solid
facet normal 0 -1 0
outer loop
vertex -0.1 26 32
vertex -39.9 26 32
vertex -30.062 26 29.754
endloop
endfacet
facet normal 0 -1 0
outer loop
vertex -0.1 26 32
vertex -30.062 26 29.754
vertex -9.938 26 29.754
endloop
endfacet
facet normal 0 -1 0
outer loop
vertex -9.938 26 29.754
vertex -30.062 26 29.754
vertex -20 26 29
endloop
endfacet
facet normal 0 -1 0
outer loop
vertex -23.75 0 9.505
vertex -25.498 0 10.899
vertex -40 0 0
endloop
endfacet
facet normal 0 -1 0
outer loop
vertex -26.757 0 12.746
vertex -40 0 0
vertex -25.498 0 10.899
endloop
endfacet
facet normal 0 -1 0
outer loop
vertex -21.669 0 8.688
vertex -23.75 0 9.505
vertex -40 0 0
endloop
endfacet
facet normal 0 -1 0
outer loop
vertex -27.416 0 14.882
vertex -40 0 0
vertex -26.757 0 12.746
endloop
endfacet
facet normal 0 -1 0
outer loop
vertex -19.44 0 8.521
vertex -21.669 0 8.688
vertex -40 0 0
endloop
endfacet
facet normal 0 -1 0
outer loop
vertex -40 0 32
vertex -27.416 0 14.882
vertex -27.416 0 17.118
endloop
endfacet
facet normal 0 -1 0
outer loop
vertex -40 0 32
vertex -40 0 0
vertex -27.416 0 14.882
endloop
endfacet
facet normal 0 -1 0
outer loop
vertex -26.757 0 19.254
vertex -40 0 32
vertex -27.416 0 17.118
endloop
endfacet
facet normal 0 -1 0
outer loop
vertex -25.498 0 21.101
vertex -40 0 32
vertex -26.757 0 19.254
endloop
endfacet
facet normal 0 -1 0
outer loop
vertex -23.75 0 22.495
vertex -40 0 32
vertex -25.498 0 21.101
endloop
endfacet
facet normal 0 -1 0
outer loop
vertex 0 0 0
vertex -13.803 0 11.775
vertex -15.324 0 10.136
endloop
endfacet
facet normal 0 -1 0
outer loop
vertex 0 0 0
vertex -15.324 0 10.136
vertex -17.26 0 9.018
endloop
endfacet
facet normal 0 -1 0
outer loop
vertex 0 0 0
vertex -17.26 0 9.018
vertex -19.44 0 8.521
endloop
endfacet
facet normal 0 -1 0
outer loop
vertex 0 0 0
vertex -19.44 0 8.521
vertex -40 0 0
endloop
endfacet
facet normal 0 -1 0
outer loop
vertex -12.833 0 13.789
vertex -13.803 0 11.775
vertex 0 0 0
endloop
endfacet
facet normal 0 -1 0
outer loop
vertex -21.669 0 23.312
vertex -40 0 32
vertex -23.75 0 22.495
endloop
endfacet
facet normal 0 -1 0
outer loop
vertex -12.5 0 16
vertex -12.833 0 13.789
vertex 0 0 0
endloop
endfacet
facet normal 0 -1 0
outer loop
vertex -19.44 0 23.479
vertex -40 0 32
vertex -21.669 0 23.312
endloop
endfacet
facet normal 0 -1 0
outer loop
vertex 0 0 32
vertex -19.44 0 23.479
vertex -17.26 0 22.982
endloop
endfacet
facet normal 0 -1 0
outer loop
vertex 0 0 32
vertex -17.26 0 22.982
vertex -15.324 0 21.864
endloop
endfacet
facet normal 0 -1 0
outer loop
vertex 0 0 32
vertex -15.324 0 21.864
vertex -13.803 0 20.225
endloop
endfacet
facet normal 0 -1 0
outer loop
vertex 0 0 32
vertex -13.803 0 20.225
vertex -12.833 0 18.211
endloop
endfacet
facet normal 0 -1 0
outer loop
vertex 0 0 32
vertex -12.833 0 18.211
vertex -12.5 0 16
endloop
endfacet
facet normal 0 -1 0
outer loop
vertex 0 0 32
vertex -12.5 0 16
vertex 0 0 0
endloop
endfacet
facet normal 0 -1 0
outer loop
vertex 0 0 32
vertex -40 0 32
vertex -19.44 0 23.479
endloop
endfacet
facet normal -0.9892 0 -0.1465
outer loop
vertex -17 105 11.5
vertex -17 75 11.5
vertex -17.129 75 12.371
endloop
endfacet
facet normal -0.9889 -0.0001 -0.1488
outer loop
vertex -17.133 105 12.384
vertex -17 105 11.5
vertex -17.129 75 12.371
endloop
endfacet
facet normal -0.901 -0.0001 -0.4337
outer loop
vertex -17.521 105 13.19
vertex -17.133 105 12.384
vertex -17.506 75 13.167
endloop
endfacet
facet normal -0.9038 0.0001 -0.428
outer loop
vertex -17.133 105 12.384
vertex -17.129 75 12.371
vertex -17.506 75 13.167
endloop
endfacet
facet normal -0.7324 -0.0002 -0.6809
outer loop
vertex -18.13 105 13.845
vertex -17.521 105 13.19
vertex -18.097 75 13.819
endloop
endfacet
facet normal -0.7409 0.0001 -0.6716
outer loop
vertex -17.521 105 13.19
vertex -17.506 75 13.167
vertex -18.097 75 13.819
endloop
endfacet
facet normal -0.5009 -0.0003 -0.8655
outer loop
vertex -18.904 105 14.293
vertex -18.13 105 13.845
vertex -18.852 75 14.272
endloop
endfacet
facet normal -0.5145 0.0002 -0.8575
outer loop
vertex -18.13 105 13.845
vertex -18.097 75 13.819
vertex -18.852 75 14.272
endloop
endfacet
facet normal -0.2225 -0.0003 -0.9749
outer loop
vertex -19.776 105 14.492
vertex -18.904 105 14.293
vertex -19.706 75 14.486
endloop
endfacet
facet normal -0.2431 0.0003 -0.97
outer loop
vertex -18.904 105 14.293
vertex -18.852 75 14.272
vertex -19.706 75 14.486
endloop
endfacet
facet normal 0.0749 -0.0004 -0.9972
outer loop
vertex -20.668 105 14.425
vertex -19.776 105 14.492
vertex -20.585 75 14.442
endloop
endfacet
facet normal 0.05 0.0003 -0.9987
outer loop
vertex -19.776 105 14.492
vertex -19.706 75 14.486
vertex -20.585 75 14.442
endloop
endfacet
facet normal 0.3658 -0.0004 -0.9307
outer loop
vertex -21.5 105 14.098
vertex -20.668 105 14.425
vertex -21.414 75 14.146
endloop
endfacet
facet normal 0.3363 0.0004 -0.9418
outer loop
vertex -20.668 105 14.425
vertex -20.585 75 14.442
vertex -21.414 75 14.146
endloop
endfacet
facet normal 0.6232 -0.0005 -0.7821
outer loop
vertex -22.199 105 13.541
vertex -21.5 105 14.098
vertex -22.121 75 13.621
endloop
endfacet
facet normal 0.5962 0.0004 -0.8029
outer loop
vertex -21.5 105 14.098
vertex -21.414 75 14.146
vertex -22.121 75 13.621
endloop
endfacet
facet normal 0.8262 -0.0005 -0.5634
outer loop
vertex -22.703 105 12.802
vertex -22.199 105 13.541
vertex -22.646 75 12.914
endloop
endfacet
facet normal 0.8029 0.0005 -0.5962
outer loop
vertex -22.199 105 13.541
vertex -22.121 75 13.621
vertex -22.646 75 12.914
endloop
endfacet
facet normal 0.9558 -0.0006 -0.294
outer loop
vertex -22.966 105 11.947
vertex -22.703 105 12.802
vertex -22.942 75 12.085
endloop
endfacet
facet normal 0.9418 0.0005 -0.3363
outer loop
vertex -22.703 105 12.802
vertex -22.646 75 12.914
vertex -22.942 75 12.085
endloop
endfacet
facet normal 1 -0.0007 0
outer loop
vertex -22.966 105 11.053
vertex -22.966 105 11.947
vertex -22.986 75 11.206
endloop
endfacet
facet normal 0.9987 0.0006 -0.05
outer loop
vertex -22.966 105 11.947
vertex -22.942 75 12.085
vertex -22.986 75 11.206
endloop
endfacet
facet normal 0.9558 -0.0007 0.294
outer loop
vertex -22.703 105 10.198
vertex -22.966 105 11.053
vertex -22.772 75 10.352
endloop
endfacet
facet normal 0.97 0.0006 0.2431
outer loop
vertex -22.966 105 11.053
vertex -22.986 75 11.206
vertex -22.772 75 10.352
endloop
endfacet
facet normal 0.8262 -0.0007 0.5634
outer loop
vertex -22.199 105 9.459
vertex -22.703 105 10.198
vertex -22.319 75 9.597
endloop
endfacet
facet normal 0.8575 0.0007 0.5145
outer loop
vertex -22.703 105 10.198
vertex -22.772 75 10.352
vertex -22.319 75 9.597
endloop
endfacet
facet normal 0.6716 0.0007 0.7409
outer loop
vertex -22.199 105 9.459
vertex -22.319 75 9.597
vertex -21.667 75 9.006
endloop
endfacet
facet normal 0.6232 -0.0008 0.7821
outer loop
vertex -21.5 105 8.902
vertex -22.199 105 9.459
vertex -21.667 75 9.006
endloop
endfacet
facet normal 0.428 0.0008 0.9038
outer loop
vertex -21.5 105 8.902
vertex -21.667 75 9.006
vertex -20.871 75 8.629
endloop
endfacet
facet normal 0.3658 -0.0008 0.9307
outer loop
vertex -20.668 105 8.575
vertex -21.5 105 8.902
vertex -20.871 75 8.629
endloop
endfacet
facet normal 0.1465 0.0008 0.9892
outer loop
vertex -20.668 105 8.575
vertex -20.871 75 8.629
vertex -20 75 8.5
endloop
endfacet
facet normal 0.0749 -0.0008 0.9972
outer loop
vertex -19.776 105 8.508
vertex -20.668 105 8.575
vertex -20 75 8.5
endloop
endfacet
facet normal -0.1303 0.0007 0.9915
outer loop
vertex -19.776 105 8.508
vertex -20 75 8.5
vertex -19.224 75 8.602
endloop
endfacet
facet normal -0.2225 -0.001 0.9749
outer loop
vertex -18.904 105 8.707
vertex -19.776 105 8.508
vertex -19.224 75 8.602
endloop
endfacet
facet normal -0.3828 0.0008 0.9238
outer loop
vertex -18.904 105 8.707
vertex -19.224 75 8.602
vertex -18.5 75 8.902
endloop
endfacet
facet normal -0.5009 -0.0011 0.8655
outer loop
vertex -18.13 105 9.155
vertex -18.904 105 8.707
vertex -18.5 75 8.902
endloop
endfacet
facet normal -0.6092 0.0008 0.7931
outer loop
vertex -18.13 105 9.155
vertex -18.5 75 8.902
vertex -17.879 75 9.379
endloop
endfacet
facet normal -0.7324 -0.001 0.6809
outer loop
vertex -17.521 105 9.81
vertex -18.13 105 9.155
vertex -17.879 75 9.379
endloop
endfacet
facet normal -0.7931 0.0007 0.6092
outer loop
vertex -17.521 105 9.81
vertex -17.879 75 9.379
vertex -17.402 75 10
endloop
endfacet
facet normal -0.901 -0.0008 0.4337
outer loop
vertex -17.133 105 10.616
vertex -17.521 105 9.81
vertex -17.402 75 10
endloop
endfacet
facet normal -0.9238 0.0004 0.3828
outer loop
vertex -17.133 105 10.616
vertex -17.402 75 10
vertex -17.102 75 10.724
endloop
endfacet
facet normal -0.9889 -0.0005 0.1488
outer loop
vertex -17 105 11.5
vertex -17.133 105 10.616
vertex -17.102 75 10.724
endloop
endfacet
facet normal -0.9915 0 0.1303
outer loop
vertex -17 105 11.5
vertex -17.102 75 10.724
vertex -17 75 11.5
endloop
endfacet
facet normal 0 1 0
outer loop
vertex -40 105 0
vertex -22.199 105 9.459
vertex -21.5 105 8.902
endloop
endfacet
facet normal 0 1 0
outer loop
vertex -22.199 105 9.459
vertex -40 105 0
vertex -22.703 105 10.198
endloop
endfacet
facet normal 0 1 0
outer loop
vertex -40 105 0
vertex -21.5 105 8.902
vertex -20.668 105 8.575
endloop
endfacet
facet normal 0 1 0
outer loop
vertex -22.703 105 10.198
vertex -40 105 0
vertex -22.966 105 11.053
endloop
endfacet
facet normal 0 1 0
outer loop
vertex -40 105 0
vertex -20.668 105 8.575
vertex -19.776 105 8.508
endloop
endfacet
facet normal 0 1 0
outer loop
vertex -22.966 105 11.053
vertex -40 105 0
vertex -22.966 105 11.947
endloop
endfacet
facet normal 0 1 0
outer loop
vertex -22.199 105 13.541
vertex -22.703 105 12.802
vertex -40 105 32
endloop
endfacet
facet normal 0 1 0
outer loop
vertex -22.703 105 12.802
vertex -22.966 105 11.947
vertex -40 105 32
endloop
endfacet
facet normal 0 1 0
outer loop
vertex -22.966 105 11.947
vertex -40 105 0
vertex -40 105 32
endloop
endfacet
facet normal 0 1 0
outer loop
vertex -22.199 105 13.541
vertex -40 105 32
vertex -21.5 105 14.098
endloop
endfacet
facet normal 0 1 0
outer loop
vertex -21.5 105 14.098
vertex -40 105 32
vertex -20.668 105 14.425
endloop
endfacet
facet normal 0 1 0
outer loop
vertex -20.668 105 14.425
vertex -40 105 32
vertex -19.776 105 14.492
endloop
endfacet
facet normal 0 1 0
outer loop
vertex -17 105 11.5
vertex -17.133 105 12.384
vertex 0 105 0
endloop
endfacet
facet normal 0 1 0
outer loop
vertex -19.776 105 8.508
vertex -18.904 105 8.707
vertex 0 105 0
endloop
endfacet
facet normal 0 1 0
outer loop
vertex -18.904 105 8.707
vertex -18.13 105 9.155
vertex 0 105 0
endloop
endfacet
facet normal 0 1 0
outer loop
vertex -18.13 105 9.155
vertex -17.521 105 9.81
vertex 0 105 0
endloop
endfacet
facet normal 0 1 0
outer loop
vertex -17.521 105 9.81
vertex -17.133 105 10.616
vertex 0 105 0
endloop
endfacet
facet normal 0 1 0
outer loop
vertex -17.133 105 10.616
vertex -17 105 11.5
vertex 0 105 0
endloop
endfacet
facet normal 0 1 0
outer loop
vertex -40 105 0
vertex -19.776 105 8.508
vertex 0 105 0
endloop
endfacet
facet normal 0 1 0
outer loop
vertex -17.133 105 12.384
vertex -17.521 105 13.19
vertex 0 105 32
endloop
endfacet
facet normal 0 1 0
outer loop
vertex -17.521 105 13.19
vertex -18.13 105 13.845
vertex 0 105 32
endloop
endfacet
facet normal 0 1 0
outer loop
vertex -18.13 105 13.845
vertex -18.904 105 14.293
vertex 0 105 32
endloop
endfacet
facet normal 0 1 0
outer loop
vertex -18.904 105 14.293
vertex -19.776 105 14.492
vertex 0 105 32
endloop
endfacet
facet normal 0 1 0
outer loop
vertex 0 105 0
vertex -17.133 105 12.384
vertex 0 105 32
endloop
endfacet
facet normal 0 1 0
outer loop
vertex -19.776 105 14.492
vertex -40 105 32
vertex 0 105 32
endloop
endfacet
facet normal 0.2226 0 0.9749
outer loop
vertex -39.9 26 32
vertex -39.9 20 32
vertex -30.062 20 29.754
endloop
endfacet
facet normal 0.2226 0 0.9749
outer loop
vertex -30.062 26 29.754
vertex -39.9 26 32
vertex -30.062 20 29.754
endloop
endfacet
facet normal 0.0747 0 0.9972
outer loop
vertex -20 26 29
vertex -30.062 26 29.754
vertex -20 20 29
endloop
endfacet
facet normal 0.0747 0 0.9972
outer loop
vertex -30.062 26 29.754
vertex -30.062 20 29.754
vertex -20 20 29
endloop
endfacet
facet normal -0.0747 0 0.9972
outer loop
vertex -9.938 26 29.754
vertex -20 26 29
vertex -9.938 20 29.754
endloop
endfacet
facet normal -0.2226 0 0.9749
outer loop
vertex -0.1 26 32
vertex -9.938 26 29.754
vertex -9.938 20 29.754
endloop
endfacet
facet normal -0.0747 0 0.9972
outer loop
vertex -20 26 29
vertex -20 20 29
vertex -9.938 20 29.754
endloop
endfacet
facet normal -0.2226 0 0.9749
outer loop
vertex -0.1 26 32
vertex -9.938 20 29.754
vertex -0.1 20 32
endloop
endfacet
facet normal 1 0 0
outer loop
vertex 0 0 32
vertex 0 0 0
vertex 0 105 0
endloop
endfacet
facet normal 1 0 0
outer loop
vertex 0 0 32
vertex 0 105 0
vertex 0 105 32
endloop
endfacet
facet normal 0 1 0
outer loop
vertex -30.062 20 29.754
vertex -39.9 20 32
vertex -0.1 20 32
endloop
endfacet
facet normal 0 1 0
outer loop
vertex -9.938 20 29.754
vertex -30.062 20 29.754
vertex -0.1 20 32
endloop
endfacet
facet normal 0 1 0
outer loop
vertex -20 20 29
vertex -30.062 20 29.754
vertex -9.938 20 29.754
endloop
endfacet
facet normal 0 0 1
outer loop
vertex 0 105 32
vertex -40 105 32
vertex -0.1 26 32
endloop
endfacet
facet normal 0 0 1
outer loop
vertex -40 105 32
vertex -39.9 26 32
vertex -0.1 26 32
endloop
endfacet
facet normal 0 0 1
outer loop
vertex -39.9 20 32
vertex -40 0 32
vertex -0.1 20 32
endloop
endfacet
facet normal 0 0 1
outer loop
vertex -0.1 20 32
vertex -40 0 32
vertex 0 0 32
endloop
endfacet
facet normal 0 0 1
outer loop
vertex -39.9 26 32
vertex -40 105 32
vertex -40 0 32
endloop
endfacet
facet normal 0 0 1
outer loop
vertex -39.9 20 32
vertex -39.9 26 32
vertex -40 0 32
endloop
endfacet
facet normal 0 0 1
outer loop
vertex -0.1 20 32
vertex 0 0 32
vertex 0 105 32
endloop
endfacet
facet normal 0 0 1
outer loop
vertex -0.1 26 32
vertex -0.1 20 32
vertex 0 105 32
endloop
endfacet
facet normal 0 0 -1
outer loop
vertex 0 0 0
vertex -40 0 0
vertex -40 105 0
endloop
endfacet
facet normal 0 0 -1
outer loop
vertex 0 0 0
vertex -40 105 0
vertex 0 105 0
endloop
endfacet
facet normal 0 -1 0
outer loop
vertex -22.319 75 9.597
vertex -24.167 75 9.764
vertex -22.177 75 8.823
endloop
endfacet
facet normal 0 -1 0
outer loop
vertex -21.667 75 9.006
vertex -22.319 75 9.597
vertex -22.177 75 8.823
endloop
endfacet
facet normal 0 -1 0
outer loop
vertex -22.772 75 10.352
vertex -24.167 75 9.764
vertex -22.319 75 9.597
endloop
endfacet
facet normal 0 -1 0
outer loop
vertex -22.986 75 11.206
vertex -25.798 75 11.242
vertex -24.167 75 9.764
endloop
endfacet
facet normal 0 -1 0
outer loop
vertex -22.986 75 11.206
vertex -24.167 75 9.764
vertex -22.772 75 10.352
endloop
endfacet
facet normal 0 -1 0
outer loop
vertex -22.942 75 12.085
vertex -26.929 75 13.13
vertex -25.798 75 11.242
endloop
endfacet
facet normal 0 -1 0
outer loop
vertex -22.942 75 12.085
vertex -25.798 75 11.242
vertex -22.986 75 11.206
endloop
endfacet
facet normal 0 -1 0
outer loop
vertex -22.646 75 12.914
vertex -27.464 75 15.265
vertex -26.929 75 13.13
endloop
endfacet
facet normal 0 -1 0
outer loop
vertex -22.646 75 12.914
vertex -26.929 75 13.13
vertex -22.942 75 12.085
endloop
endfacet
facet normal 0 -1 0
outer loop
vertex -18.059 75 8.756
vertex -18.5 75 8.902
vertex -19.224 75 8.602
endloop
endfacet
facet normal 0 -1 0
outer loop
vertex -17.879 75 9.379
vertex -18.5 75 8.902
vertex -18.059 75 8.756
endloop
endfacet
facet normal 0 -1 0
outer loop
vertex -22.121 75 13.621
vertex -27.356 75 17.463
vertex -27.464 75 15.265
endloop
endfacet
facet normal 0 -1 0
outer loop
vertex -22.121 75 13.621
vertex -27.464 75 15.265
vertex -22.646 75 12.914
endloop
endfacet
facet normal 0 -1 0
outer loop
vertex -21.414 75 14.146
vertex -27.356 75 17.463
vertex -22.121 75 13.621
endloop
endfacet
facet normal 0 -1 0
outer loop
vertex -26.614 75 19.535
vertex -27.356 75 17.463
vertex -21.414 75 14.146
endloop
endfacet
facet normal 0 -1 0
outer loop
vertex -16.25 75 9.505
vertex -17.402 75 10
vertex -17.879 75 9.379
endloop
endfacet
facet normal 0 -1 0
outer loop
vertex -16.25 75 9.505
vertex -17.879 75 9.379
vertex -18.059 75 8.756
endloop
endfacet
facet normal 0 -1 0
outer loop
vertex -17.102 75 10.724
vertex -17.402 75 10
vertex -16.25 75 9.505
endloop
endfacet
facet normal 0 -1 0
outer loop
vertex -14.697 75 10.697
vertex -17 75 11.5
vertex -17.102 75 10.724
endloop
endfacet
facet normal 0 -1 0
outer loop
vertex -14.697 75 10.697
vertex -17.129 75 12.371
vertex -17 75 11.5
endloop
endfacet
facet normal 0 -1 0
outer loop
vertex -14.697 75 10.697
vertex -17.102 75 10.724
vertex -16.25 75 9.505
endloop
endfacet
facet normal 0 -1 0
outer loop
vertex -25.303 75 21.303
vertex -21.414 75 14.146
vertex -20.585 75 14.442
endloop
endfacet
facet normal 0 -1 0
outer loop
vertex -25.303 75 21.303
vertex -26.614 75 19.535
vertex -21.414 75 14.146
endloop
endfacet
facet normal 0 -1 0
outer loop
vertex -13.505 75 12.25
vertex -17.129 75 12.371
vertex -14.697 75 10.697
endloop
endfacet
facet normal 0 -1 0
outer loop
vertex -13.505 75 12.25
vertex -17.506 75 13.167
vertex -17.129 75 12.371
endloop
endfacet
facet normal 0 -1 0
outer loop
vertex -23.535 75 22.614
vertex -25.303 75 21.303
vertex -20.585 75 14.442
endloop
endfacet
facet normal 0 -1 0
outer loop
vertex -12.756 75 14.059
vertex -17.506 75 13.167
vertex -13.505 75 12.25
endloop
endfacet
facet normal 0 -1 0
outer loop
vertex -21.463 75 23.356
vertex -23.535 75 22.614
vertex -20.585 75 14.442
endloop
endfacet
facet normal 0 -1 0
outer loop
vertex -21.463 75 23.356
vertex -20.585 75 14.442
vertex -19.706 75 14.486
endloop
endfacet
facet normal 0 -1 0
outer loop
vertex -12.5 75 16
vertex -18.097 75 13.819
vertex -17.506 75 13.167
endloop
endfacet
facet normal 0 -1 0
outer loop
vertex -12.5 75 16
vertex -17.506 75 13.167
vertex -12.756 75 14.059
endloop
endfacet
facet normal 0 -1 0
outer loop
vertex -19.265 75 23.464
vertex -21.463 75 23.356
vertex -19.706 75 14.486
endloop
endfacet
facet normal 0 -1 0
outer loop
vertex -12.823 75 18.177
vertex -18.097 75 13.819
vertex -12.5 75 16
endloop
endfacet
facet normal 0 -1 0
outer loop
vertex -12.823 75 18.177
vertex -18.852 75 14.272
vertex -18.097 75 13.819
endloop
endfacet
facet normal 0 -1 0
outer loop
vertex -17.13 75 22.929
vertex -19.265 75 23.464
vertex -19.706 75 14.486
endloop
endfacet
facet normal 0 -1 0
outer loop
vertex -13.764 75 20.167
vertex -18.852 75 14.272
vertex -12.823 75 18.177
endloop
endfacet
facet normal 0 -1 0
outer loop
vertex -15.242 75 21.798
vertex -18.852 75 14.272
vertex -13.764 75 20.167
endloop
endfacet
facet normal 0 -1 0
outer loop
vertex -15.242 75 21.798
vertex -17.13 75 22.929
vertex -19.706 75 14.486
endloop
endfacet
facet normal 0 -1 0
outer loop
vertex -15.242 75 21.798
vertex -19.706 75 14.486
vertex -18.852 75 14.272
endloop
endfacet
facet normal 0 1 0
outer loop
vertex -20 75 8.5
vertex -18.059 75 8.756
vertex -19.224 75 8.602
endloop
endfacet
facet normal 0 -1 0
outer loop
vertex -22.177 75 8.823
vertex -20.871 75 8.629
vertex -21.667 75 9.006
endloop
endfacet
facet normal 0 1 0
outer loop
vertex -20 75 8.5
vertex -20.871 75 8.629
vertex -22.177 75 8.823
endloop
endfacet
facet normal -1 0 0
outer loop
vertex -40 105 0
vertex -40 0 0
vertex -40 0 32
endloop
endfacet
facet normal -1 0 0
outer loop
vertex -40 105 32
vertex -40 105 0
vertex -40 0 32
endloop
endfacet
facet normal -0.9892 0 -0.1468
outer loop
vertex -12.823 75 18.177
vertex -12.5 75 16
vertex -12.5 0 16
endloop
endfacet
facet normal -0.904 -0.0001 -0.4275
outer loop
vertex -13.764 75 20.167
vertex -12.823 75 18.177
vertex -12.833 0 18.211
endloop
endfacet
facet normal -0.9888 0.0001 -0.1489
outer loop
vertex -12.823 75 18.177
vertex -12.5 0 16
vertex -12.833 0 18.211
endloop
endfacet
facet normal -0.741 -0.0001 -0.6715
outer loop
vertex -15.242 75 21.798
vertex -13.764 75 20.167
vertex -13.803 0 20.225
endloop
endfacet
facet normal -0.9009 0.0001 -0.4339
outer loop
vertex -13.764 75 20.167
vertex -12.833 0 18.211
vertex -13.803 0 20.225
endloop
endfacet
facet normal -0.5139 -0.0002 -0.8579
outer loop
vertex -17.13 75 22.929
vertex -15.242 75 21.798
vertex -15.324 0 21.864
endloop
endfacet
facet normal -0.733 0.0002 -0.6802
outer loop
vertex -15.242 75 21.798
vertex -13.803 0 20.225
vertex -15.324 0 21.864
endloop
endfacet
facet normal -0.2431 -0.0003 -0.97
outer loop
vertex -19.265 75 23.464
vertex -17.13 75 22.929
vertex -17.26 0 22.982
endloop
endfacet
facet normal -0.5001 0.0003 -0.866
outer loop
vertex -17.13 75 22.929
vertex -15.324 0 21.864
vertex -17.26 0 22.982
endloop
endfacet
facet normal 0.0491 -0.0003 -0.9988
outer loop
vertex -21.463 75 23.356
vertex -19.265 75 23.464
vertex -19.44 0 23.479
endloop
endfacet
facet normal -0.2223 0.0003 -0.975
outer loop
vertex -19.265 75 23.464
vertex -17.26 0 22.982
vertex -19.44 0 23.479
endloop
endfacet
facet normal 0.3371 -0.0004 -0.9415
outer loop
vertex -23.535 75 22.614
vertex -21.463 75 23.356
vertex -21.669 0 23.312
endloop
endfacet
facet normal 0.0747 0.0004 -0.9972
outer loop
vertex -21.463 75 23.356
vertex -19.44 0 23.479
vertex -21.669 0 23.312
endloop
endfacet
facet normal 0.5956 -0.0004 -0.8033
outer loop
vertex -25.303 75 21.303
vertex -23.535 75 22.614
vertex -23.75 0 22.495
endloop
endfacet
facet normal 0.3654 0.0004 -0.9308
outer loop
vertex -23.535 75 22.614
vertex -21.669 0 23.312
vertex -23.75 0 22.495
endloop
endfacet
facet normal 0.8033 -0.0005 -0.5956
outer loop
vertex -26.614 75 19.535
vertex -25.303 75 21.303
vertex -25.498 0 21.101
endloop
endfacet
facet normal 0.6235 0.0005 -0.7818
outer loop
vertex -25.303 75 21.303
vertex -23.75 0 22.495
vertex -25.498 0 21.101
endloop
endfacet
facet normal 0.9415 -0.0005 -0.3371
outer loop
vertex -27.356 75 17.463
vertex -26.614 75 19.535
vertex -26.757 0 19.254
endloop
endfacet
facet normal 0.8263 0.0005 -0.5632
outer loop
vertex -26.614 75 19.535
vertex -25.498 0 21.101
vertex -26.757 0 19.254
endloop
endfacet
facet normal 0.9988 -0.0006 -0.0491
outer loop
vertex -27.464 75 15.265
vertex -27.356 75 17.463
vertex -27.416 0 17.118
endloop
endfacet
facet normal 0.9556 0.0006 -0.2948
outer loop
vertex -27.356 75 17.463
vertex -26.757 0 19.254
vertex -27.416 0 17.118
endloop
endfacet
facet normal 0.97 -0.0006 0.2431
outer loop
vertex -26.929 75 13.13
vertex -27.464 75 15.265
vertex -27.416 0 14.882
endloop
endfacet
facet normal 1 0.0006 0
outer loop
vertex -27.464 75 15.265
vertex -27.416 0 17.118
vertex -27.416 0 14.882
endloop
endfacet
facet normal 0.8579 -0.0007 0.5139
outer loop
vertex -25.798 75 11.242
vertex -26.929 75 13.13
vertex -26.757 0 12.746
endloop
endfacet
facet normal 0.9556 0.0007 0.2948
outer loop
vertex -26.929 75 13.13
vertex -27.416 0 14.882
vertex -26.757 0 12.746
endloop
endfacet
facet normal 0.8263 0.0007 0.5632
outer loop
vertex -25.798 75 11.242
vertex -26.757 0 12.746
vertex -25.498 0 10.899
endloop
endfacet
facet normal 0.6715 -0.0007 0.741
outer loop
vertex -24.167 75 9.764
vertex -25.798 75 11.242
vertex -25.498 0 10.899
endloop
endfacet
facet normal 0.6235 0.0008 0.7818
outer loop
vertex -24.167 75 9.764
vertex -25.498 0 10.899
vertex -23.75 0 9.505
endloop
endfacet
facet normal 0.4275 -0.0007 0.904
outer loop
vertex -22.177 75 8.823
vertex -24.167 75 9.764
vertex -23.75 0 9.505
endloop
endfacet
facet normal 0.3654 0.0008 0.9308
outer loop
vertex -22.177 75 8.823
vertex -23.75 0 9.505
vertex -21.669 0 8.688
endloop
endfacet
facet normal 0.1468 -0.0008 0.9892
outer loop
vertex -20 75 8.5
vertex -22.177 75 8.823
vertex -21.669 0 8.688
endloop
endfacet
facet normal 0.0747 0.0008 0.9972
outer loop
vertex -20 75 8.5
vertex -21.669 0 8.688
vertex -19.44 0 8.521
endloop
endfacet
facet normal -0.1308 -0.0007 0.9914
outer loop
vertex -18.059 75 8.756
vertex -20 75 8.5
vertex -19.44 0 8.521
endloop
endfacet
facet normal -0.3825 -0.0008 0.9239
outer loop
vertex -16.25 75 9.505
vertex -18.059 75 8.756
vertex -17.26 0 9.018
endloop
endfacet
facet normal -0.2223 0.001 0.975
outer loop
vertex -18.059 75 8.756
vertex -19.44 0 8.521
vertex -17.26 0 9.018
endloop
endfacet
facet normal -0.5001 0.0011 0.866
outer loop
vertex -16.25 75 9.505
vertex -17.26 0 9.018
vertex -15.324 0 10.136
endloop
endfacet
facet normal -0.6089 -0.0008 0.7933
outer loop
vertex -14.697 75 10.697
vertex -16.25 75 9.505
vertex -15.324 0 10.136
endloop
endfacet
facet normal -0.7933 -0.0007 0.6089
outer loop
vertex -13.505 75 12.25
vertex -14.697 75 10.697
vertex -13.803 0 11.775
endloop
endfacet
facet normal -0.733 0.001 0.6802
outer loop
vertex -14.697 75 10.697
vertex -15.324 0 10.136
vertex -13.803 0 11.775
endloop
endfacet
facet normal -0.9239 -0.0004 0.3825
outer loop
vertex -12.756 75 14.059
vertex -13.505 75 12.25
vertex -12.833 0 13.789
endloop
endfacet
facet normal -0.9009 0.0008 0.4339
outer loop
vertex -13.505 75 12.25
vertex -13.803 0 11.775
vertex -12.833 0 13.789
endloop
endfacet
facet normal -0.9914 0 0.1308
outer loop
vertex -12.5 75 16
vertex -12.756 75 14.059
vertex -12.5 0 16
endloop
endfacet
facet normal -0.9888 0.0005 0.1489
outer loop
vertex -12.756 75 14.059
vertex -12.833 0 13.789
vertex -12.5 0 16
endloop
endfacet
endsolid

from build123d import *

# Parameters (mm, degrees)
F0_W     = 40
F0_H     = 32
F1_DEPTH = 105
F2_R     = 7.5
F3_DEPTH = 75
F4_R     = 3
F5_DEPTH = 105.001
F7_R     = 67.5
F8_DEPTH = 6


with BuildPart() as f1:
    # F0 (on Front) → F1 (new body)
    with BuildSketch(Plane.XZ):
        with Locations((-20, 16)):
            Rectangle(F0_W, F0_H)
    extrude(amount=-F1_DEPTH)

    # F2 (on face) → F3 (cut)
    with BuildSketch(Plane.XZ):
        with Locations((-20, 16)):
            Circle(F2_R)
    extrude(amount=-F3_DEPTH, mode=Mode.SUBTRACT)

    # F4 (on Front) → F5 (cut, through all)
    with BuildSketch(Plane.XZ):
        with Locations((-20, 11.5)):
            Circle(F4_R)
    extrude(amount=-F5_DEPTH, mode=Mode.SUBTRACT)

    # F7 (on offset) → F8 (cut)
    with BuildSketch(Plane.XZ.offset(-20)):
        with Locations((-20, 96.5)):
            Circle(F7_R)
    extrude(amount=-F8_DEPTH, mode=Mode.SUBTRACT)


solid = f1.part
